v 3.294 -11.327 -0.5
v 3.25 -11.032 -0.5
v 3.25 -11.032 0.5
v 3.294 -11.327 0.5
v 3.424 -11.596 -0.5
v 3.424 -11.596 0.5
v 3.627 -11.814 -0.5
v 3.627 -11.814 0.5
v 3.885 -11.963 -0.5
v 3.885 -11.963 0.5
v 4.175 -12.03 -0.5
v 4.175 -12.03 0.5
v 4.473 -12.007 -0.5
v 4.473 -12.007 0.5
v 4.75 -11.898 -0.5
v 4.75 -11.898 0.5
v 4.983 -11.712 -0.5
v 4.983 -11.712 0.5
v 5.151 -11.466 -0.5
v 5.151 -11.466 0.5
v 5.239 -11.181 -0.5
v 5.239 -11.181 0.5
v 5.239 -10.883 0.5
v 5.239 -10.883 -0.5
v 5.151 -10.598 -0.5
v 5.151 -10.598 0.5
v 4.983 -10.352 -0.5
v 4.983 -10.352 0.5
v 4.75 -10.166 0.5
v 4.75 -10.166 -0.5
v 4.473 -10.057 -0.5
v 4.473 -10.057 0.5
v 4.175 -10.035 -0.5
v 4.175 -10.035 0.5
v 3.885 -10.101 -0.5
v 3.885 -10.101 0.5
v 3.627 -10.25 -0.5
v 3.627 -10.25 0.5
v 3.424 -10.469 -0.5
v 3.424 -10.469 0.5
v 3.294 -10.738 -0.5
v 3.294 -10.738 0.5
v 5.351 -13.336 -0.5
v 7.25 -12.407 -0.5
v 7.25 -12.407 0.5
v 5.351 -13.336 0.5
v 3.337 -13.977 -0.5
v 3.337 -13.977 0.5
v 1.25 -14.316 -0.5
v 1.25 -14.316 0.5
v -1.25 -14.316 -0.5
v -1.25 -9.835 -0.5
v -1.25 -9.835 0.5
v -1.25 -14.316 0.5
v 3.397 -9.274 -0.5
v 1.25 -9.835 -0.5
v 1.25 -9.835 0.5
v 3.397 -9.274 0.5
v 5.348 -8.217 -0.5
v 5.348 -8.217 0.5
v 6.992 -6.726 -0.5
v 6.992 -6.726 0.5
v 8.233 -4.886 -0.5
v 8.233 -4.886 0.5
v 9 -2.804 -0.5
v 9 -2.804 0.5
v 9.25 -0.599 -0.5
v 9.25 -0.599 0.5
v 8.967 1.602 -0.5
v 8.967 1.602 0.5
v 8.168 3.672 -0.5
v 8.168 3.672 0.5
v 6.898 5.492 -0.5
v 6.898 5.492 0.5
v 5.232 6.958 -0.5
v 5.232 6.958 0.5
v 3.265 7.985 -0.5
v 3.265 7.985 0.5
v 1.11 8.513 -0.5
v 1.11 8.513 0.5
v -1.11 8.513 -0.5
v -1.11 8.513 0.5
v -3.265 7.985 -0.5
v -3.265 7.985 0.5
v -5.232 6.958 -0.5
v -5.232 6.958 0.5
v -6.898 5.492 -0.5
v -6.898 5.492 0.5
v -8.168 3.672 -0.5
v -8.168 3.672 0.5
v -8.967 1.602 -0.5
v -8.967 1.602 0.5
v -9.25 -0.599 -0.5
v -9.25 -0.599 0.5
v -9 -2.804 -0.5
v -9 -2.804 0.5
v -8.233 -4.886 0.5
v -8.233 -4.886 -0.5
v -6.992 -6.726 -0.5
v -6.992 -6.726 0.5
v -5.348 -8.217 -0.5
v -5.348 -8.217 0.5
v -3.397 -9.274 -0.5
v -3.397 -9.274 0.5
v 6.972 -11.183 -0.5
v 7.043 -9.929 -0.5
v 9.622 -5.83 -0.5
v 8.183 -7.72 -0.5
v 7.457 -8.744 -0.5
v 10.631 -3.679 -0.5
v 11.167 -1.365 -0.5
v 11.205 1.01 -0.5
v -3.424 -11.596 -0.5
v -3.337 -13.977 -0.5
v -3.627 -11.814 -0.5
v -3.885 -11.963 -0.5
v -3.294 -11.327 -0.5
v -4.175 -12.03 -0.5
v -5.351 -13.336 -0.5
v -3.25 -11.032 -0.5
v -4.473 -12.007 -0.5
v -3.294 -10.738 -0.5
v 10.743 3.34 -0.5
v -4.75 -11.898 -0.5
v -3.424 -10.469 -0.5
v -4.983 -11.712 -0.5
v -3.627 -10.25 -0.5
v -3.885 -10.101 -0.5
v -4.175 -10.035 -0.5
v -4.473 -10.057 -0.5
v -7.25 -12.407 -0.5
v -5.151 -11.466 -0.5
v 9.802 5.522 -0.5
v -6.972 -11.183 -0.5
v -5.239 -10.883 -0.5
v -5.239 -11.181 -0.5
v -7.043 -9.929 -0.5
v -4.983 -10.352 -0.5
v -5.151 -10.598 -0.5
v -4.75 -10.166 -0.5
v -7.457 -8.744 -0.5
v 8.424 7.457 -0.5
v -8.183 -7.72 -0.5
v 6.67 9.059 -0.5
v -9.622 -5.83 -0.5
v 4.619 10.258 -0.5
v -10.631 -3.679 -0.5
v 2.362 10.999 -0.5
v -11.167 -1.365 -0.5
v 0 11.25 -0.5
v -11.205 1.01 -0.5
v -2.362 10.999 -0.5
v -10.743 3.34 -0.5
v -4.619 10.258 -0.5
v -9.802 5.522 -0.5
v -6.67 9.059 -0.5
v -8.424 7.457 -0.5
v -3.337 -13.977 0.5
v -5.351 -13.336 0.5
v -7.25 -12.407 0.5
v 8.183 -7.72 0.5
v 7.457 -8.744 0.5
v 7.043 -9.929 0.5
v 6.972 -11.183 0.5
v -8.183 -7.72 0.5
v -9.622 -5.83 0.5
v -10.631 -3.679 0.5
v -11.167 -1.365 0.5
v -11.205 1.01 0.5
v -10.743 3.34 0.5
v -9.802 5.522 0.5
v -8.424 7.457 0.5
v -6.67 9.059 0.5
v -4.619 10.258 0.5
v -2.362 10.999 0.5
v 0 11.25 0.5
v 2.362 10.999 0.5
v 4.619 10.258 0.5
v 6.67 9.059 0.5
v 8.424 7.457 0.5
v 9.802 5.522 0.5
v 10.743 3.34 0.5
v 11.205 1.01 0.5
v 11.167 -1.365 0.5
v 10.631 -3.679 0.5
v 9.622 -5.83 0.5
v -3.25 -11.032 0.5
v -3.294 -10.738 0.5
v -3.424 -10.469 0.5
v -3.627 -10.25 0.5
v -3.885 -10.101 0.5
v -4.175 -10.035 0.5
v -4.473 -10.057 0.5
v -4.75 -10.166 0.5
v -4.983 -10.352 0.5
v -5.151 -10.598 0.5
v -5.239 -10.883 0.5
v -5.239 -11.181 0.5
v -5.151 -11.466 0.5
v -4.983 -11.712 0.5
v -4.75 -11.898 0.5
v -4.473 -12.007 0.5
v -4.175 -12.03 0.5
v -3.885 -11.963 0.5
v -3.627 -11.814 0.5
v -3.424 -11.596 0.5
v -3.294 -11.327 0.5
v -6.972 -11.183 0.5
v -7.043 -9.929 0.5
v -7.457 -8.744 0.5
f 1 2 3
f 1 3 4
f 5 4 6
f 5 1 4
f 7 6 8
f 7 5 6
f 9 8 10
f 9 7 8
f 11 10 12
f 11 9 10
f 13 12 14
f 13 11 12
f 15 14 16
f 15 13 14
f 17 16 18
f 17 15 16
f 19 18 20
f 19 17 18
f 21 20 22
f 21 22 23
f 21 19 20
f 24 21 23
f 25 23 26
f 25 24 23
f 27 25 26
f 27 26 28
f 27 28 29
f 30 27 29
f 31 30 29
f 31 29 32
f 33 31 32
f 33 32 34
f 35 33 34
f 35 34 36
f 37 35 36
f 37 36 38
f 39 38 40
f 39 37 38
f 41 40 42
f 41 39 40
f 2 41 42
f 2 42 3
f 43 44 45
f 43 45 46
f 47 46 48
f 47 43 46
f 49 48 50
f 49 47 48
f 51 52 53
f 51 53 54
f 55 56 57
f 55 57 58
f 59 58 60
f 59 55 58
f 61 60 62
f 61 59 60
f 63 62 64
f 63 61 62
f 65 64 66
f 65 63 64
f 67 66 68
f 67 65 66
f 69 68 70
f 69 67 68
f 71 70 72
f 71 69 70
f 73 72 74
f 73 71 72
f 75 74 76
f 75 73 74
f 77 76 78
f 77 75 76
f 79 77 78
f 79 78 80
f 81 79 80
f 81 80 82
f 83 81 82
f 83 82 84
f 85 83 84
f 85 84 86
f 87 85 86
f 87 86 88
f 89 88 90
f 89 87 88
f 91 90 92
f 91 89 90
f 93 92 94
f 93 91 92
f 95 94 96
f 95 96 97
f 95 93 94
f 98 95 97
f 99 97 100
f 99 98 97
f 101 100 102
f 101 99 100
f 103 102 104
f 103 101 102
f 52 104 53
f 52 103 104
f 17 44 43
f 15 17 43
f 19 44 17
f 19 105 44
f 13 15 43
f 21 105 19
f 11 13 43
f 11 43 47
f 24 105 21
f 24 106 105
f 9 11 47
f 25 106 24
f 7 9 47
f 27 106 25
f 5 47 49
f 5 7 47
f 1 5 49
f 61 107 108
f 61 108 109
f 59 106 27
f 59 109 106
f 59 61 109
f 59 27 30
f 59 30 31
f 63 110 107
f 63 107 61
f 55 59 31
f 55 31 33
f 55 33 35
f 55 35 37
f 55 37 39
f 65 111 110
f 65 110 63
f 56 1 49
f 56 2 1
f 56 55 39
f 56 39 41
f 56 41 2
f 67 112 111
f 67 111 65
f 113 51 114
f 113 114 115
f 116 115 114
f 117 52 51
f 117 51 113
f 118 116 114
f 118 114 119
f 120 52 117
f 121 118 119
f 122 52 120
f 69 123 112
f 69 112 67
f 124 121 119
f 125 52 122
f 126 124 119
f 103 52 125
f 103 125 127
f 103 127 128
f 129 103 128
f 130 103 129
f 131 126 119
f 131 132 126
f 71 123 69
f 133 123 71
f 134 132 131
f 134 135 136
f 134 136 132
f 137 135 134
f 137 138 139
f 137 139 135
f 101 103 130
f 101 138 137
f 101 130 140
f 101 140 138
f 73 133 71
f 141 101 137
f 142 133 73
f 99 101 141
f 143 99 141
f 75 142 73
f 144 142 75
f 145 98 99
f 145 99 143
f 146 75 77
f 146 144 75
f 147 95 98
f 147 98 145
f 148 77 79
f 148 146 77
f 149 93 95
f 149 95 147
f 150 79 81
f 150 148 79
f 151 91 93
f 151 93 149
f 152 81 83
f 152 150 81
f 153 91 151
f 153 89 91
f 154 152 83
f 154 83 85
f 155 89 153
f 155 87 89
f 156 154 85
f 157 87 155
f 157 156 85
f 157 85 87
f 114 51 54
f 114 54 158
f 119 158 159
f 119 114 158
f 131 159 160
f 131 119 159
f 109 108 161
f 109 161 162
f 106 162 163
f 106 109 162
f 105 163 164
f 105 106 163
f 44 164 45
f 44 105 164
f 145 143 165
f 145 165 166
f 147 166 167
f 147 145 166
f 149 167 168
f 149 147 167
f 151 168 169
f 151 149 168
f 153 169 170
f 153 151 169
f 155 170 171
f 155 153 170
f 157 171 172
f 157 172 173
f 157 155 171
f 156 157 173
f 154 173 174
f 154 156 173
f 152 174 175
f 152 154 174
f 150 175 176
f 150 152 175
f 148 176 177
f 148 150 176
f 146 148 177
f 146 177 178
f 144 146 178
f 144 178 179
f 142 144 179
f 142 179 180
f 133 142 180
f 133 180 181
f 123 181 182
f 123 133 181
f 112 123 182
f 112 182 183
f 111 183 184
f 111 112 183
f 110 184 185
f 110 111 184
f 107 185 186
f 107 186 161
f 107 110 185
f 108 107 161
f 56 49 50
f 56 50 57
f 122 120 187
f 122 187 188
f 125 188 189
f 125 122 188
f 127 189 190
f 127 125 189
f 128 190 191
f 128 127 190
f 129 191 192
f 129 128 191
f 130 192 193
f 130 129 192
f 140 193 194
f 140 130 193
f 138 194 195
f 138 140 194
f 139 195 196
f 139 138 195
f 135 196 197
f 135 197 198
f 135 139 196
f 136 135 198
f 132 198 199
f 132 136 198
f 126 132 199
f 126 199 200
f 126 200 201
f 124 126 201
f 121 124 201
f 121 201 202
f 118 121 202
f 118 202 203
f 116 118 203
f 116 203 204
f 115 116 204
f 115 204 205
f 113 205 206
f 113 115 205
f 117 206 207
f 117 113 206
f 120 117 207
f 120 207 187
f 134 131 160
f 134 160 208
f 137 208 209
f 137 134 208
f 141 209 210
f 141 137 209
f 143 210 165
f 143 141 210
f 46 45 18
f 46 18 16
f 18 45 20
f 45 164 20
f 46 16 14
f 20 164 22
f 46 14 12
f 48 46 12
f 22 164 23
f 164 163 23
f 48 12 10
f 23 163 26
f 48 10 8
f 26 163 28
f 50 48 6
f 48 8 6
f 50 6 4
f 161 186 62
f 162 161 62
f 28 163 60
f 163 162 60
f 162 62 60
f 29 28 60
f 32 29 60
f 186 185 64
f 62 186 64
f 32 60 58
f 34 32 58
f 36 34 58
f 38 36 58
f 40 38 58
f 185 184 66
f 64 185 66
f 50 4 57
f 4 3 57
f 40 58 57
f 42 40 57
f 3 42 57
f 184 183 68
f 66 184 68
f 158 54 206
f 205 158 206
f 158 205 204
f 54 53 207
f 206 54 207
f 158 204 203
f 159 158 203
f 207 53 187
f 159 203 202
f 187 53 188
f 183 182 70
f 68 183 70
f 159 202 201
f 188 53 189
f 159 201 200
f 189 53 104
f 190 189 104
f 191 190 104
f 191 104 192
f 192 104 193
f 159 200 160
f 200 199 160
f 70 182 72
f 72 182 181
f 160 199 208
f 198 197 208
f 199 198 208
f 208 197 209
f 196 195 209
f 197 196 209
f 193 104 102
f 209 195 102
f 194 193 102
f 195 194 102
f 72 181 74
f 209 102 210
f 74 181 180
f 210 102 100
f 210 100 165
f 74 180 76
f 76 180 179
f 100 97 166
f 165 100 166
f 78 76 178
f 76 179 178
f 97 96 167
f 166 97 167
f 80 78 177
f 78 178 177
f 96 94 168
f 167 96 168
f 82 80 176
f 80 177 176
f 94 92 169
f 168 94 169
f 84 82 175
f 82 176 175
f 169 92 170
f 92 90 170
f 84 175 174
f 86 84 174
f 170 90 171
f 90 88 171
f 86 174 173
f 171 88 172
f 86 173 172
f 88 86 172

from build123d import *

# Parameters (mm, degrees)
EXTRUDE_991_DEPTH      = 0.5
EXTRUDE_991_DEPTH_BACK = 0.5
SKETCH_1_R             = 1


with BuildPart() as part:
    # 草图1 → Extrude 991 (new, two sides: drawn at the far end of the back side and taken through both)
    with BuildSketch(Plane.XY.offset(-EXTRUDE_991_DEPTH_BACK)):
        with BuildLine():
            Line((-1.25, -9.83515139), (-1.25, -14.315530029))
            ThreePointArc((-1.25, -14.315530029), (-4.355811387, -13.693933225), (-7.25, -12.407030265))
            ThreePointArc((-7.25, -12.407030265), (-7.042959472, -9.929441632), (-8.18310536, -7.720057427))
            ThreePointArc((-8.18310536, -7.720057427), (0, 11.25), (8.18310536, -7.720057427))
            ThreePointArc((8.18310536, -7.720057427), (7.042959472, -9.929441632), (7.25, -12.407030265))
            ThreePointArc((7.25, -12.407030265), (4.355811387, -13.693933225), (1.25, -14.315530029))
            Line((1.25, -14.315530029), (1.25, -9.83515139))
            ThreePointArc((1.25, -9.83515139), (0, 8.58), (-1.25, -9.83515139))
        make_face()
        with Locations((-4.25, -11.032311518)):
            Circle(SKETCH_1_R, mode=Mode.SUBTRACT)
        with Locations((4.25, -11.032311518)):
            Circle(SKETCH_1_R, mode=Mode.SUBTRACT)
    extrude(amount=EXTRUDE_991_DEPTH + EXTRUDE_991_DEPTH_BACK)


solid = part.part
